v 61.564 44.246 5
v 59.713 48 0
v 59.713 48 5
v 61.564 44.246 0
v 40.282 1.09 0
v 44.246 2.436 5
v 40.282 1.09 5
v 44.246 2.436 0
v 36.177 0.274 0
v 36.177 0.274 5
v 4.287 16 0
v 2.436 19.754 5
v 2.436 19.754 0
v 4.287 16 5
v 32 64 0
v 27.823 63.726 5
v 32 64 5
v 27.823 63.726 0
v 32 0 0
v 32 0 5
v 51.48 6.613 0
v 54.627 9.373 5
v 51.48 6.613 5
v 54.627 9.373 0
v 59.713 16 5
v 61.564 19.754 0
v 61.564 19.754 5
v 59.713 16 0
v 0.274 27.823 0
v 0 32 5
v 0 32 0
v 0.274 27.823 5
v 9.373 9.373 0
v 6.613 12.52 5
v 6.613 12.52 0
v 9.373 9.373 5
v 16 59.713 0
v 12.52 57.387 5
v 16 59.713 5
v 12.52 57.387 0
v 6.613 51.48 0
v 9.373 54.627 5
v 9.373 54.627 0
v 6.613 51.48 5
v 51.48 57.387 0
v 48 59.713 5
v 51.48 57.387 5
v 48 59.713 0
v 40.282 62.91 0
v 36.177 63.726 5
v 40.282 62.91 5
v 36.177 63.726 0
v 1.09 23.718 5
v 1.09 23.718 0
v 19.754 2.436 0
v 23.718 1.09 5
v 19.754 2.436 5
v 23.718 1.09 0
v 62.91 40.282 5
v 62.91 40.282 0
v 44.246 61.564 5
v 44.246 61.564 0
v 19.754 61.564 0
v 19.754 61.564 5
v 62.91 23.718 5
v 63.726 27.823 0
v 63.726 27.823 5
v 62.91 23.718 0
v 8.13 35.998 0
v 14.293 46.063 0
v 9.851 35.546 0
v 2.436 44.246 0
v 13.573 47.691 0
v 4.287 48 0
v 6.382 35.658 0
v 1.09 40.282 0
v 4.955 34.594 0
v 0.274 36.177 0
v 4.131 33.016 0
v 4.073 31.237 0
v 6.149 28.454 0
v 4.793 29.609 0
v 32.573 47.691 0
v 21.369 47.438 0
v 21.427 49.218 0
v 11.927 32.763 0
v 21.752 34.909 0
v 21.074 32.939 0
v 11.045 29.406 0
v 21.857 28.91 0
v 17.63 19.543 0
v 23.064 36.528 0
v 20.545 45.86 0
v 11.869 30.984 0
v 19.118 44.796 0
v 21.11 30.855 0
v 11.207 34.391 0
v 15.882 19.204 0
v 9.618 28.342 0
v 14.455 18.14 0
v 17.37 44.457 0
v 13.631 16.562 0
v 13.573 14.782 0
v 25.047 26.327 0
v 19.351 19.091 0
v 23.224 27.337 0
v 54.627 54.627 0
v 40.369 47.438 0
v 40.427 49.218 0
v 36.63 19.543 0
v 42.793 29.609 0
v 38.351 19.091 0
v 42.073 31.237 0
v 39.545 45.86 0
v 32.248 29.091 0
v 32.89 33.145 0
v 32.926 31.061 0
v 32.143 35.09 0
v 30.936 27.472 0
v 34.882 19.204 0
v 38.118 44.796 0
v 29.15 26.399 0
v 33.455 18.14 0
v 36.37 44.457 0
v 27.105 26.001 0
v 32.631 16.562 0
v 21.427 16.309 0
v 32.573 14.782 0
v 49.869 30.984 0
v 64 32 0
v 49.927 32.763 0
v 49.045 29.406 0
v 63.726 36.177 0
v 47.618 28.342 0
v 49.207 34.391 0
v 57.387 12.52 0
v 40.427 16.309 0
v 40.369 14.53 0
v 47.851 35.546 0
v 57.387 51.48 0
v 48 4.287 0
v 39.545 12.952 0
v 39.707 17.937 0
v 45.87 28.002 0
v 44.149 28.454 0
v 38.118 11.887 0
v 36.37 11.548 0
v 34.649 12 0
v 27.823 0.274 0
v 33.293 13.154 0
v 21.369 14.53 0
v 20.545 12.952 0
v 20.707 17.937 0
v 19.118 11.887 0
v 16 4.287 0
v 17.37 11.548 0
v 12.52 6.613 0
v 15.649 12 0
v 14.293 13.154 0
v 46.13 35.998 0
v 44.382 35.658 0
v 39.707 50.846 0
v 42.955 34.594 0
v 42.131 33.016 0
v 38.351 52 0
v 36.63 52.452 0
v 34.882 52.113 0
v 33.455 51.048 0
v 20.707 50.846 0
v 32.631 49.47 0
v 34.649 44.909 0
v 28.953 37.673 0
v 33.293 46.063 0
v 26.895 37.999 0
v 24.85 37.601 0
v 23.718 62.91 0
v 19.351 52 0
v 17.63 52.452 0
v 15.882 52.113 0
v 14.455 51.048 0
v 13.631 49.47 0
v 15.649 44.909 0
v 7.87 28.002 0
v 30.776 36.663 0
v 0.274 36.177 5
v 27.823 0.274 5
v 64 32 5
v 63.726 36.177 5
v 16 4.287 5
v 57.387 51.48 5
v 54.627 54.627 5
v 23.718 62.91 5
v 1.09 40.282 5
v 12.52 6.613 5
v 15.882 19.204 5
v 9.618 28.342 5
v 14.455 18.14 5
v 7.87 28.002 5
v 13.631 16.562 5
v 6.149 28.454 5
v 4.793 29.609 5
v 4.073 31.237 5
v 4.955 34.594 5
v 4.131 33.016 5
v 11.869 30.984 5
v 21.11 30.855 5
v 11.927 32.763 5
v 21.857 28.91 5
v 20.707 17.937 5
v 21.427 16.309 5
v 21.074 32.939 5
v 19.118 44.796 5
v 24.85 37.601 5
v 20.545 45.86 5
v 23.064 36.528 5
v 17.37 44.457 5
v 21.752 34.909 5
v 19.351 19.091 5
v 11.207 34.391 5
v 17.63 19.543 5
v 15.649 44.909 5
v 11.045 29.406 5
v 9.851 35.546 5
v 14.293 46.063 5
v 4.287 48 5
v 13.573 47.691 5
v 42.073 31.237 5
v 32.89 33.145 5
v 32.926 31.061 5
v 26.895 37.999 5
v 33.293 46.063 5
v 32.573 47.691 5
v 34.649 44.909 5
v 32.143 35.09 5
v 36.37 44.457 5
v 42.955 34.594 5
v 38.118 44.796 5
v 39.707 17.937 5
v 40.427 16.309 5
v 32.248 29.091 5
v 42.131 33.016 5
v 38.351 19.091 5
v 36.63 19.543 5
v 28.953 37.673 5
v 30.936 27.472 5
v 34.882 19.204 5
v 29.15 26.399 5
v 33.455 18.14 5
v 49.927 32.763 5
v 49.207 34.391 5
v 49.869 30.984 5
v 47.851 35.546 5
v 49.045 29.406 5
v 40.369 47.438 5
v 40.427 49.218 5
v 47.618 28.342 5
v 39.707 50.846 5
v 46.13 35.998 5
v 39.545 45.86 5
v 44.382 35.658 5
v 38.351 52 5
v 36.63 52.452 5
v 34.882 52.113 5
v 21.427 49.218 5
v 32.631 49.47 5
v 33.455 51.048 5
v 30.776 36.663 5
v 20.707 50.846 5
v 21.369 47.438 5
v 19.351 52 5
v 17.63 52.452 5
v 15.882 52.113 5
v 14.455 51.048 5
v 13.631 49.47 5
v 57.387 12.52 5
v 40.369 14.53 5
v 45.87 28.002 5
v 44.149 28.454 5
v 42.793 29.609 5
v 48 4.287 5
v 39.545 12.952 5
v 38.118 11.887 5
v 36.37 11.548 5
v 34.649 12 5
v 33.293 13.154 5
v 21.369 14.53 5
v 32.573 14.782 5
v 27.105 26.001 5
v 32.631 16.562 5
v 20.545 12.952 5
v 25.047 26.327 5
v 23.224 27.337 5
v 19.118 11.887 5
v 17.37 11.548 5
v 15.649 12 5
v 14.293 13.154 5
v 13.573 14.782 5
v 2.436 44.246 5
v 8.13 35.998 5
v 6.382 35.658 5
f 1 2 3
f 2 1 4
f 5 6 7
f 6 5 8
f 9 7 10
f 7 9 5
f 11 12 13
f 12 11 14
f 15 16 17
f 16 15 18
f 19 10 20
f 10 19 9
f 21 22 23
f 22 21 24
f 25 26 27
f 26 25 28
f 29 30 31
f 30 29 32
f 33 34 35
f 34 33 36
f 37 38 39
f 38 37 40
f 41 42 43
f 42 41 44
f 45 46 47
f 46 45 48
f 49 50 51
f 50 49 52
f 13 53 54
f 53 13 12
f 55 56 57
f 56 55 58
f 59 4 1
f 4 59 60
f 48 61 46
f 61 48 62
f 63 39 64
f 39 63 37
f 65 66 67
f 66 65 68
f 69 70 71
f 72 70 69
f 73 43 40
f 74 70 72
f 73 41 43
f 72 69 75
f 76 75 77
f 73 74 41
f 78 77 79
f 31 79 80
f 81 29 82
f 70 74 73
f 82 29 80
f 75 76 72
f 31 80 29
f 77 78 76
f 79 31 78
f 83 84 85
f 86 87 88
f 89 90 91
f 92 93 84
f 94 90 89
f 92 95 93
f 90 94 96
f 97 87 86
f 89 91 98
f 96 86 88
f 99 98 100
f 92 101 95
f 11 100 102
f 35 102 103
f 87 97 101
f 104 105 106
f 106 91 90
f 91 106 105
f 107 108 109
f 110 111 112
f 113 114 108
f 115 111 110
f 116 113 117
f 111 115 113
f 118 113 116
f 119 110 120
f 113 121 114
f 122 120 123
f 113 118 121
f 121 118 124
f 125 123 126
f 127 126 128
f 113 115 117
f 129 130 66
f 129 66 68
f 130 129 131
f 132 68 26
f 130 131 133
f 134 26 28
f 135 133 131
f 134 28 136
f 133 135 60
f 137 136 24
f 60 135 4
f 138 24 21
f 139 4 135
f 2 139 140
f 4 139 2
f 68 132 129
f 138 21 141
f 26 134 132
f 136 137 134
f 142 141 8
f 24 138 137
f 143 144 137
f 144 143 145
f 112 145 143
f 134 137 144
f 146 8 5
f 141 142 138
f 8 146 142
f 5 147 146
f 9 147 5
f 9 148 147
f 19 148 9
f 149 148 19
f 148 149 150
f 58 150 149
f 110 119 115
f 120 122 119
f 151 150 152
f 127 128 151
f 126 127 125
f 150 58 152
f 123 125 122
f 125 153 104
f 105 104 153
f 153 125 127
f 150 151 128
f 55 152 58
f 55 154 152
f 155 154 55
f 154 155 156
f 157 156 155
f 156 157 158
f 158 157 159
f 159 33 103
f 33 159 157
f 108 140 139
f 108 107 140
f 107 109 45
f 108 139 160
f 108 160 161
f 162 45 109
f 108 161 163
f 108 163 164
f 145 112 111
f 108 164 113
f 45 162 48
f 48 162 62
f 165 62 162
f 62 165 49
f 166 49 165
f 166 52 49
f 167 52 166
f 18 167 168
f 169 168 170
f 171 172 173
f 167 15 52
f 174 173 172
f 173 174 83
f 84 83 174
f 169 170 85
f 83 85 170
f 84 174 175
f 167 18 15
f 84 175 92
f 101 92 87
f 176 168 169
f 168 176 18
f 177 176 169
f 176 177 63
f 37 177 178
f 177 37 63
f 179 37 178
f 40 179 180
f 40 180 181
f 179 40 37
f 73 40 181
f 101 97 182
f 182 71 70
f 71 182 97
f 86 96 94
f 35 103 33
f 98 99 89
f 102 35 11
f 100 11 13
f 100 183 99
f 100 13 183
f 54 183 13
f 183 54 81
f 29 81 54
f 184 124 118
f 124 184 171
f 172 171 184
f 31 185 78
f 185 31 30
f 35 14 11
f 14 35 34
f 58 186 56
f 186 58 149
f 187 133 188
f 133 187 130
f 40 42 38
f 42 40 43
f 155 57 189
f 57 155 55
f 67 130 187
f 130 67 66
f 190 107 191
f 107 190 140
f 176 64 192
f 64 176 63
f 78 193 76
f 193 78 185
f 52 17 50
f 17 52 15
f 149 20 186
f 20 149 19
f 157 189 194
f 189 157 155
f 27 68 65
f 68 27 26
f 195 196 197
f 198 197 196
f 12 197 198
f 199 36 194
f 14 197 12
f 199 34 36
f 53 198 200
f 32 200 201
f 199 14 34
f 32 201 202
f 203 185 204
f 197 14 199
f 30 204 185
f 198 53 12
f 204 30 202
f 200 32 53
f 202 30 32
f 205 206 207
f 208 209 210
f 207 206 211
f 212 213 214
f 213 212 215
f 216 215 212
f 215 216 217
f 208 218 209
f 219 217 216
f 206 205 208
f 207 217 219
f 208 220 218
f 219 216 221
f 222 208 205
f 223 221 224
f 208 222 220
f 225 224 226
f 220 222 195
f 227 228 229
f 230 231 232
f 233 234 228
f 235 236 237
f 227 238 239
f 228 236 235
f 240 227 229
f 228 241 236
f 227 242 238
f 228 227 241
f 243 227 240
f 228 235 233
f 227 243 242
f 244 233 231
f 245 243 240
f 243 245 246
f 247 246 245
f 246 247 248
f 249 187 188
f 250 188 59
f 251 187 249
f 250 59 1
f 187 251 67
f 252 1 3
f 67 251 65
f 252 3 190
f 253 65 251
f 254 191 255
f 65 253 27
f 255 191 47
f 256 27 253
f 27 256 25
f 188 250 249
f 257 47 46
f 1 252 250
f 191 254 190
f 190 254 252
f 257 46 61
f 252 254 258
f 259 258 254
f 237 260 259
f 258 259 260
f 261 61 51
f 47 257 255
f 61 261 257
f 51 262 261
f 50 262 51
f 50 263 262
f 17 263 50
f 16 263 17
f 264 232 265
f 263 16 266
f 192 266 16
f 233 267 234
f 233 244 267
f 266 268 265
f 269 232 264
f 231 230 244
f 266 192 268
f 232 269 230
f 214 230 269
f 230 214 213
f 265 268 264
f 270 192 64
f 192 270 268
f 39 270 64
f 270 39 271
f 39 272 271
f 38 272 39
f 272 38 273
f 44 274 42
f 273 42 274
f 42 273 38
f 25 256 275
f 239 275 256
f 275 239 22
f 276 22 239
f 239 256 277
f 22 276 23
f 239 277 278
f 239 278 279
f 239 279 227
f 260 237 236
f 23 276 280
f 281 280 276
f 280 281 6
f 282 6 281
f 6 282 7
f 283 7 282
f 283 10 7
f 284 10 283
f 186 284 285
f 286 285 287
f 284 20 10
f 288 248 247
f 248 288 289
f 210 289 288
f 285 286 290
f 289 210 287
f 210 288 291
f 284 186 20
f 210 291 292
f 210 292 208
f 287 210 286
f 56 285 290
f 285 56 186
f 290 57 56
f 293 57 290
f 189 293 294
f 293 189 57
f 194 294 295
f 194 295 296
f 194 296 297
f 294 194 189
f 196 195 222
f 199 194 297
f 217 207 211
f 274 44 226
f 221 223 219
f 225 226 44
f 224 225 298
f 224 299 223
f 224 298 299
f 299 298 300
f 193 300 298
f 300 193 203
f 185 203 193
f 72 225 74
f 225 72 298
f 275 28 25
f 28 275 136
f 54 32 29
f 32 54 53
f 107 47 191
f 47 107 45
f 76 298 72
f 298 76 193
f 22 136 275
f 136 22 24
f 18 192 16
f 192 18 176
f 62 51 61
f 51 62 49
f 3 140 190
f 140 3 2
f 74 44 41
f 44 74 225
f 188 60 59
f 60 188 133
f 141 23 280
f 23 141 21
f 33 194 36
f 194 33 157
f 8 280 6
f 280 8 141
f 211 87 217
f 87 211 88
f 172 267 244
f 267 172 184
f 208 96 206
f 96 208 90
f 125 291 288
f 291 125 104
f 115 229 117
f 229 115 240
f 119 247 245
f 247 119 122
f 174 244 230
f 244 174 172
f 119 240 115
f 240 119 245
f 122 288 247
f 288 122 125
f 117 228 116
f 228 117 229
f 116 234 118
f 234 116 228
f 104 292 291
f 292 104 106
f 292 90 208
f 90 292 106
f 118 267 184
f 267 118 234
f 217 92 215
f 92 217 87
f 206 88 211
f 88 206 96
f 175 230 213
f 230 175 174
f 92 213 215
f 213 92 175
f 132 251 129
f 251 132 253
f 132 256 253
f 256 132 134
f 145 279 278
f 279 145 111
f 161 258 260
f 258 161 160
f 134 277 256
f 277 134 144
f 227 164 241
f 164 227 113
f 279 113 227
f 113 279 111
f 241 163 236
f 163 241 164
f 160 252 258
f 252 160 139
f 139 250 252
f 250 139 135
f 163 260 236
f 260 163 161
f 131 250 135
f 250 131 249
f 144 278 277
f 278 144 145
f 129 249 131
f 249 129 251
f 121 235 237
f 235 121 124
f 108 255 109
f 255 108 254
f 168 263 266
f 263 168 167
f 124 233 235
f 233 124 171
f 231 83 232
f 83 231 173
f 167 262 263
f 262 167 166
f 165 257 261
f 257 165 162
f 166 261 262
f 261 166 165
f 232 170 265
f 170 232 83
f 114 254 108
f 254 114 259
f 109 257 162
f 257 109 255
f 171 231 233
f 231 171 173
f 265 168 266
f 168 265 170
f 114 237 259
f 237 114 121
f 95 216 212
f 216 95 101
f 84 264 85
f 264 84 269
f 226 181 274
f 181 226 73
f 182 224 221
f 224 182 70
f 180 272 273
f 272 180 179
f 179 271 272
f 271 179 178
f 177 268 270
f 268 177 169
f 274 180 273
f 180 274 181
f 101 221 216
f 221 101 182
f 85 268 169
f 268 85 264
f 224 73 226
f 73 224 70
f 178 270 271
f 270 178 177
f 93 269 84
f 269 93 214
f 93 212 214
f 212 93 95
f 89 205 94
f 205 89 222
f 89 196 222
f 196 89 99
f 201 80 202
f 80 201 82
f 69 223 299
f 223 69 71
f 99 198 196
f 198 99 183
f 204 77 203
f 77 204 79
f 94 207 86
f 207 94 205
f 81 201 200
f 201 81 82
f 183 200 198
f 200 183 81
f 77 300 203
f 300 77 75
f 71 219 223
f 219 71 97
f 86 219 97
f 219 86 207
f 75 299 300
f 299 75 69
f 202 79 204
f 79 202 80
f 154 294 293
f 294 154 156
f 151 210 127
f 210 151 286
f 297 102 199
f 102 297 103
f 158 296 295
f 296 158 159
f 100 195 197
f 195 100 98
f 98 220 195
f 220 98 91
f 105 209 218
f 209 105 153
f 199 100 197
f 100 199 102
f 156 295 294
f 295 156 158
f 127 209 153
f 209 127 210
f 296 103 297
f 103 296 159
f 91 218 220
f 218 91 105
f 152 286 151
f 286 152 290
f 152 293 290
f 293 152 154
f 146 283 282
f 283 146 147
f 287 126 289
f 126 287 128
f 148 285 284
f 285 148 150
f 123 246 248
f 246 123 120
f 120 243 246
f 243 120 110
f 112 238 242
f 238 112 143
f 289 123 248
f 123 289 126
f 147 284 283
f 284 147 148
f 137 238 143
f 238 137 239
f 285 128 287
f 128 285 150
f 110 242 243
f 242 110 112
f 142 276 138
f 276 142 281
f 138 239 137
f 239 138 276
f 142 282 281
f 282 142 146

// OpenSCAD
$fn = 32;

// ----------------------------------------------------------------------
// Cam plate: eccentric cam, base R32
// ----------------------------------------------------------------------

// --- parameters (mm) ---
base_r = 32;              // base circle radius
lobe_h = 12;              // cam lobe rise
bore_r = 6;               // shaft bore radius
plate_t = 5;              // plate thickness, Z (extrusion height)
ecc = 5;                  // disc eccentricity
ring_r = 19;              // lightening ring radius
bolt_r = 4;               // lightening hole radius

profile = [[64, 32], [63.726, 36.177], [62.91, 40.282], [61.564, 44.246], [59.713, 48], [57.387, 51.48], [54.627, 54.627], [51.48, 57.387], [48, 59.713], [44.246, 61.564], [40.282, 62.91], [36.177, 63.726], [32, 64], [27.823, 63.726], [23.718, 62.91], [19.754, 61.564], [16, 59.713], [12.52, 57.387], [9.373, 54.627], [6.613, 51.48], [4.287, 48], [2.436, 44.246], [1.09, 40.282], [0.274, 36.177], [0, 32], [0.274, 27.823], [1.09, 23.718], [2.436, 19.754], [4.287, 16], [6.613, 12.52], [9.373, 9.373], [12.52, 6.613], [16, 4.287], [19.754, 2.436], [23.718, 1.09], [27.823, 0.274], [32, 0], [36.177, 0.274], [40.282, 1.09], [44.246, 2.436], [48, 4.287], [51.48, 6.613], [54.627, 9.373], [57.387, 12.52], [59.713, 16], [61.564, 19.754], [62.91, 23.718], [63.726, 27.823]];  // primary outline, 48 points, counter clockwise
void_1 = [[32.89, 33.145], [32.143, 35.09], [30.776, 36.663], [28.953, 37.673], [26.895, 37.999], [24.85, 37.601], [23.064, 36.528], [21.752, 34.909], [21.074, 32.939], [21.11, 30.855], [21.857, 28.91], [23.224, 27.337], [25.047, 26.327], [27.105, 26.001], [29.15, 26.399], [30.936, 27.472], [32.248, 29.091], [32.926, 31.061]];  // shaft bore, 18 points
void_2 = [[49.927, 32.763], [49.207, 34.391], [47.851, 35.546], [46.13, 35.998], [44.382, 35.658], [42.955, 34.594], [42.131, 33.016], [42.073, 31.237], [42.793, 29.609], [44.149, 28.454], [45.87, 28.002], [47.618, 28.342], [49.045, 29.406], [49.869, 30.984]];  // lightening hole 1, 14 points
void_3 = [[40.427, 49.218], [39.707, 50.846], [38.351, 52], [36.63, 52.452], [34.882, 52.113], [33.455, 51.048], [32.631, 49.47], [32.573, 47.691], [33.293, 46.063], [34.649, 44.909], [36.37, 44.457], [38.118, 44.796], [39.545, 45.86], [40.369, 47.438]];  // lightening hole 2, 14 points
void_4 = [[21.427, 49.218], [20.707, 50.846], [19.351, 52], [17.63, 52.452], [15.882, 52.113], [14.455, 51.048], [13.631, 49.47], [13.573, 47.691], [14.293, 46.063], [15.649, 44.909], [17.37, 44.457], [19.118, 44.796], [20.545, 45.86], [21.369, 47.438]];  // lightening hole 3, 14 points
void_5 = [[11.927, 32.763], [11.207, 34.391], [9.851, 35.546], [8.13, 35.998], [6.382, 35.658], [4.955, 34.594], [4.131, 33.016], [4.073, 31.237], [4.793, 29.609], [6.149, 28.454], [7.87, 28.002], [9.618, 28.342], [11.045, 29.406], [11.869, 30.984]];  // lightening hole 4, 14 points
void_6 = [[21.427, 16.309], [20.707, 17.937], [19.351, 19.091], [17.63, 19.543], [15.882, 19.204], [14.455, 18.14], [13.631, 16.562], [13.573, 14.782], [14.293, 13.154], [15.649, 12], [17.37, 11.548], [19.118, 11.887], [20.545, 12.952], [21.369, 14.53]];  // lightening hole 5, 14 points
void_7 = [[40.427, 16.309], [39.707, 17.937], [38.351, 19.091], [36.63, 19.543], [34.882, 19.204], [33.455, 18.14], [32.631, 16.562], [32.573, 14.782], [33.293, 13.154], [34.649, 12], [36.37, 11.548], [38.118, 11.887], [39.545, 12.952], [40.369, 14.53]];  // lightening hole 6, 14 points

// --- the one profile operation ---
difference() {
  linear_extrude(height = plate_t) polygon(points = profile);
  translate([0, 0, -1])
    linear_extrude(height = plate_t + 2) polygon(points = void_1);
  translate([0, 0, -1])
    linear_extrude(height = plate_t + 2) polygon(points = void_2);
  translate([0, 0, -1])
    linear_extrude(height = plate_t + 2) polygon(points = void_3);
  translate([0, 0, -1])
    linear_extrude(height = plate_t + 2) polygon(points = void_4);
  translate([0, 0, -1])
    linear_extrude(height = plate_t + 2) polygon(points = void_5);
  translate([0, 0, -1])
    linear_extrude(height = plate_t + 2) polygon(points = void_6);
  translate([0, 0, -1])
    linear_extrude(height = plate_t + 2) polygon(points = void_7);
}
